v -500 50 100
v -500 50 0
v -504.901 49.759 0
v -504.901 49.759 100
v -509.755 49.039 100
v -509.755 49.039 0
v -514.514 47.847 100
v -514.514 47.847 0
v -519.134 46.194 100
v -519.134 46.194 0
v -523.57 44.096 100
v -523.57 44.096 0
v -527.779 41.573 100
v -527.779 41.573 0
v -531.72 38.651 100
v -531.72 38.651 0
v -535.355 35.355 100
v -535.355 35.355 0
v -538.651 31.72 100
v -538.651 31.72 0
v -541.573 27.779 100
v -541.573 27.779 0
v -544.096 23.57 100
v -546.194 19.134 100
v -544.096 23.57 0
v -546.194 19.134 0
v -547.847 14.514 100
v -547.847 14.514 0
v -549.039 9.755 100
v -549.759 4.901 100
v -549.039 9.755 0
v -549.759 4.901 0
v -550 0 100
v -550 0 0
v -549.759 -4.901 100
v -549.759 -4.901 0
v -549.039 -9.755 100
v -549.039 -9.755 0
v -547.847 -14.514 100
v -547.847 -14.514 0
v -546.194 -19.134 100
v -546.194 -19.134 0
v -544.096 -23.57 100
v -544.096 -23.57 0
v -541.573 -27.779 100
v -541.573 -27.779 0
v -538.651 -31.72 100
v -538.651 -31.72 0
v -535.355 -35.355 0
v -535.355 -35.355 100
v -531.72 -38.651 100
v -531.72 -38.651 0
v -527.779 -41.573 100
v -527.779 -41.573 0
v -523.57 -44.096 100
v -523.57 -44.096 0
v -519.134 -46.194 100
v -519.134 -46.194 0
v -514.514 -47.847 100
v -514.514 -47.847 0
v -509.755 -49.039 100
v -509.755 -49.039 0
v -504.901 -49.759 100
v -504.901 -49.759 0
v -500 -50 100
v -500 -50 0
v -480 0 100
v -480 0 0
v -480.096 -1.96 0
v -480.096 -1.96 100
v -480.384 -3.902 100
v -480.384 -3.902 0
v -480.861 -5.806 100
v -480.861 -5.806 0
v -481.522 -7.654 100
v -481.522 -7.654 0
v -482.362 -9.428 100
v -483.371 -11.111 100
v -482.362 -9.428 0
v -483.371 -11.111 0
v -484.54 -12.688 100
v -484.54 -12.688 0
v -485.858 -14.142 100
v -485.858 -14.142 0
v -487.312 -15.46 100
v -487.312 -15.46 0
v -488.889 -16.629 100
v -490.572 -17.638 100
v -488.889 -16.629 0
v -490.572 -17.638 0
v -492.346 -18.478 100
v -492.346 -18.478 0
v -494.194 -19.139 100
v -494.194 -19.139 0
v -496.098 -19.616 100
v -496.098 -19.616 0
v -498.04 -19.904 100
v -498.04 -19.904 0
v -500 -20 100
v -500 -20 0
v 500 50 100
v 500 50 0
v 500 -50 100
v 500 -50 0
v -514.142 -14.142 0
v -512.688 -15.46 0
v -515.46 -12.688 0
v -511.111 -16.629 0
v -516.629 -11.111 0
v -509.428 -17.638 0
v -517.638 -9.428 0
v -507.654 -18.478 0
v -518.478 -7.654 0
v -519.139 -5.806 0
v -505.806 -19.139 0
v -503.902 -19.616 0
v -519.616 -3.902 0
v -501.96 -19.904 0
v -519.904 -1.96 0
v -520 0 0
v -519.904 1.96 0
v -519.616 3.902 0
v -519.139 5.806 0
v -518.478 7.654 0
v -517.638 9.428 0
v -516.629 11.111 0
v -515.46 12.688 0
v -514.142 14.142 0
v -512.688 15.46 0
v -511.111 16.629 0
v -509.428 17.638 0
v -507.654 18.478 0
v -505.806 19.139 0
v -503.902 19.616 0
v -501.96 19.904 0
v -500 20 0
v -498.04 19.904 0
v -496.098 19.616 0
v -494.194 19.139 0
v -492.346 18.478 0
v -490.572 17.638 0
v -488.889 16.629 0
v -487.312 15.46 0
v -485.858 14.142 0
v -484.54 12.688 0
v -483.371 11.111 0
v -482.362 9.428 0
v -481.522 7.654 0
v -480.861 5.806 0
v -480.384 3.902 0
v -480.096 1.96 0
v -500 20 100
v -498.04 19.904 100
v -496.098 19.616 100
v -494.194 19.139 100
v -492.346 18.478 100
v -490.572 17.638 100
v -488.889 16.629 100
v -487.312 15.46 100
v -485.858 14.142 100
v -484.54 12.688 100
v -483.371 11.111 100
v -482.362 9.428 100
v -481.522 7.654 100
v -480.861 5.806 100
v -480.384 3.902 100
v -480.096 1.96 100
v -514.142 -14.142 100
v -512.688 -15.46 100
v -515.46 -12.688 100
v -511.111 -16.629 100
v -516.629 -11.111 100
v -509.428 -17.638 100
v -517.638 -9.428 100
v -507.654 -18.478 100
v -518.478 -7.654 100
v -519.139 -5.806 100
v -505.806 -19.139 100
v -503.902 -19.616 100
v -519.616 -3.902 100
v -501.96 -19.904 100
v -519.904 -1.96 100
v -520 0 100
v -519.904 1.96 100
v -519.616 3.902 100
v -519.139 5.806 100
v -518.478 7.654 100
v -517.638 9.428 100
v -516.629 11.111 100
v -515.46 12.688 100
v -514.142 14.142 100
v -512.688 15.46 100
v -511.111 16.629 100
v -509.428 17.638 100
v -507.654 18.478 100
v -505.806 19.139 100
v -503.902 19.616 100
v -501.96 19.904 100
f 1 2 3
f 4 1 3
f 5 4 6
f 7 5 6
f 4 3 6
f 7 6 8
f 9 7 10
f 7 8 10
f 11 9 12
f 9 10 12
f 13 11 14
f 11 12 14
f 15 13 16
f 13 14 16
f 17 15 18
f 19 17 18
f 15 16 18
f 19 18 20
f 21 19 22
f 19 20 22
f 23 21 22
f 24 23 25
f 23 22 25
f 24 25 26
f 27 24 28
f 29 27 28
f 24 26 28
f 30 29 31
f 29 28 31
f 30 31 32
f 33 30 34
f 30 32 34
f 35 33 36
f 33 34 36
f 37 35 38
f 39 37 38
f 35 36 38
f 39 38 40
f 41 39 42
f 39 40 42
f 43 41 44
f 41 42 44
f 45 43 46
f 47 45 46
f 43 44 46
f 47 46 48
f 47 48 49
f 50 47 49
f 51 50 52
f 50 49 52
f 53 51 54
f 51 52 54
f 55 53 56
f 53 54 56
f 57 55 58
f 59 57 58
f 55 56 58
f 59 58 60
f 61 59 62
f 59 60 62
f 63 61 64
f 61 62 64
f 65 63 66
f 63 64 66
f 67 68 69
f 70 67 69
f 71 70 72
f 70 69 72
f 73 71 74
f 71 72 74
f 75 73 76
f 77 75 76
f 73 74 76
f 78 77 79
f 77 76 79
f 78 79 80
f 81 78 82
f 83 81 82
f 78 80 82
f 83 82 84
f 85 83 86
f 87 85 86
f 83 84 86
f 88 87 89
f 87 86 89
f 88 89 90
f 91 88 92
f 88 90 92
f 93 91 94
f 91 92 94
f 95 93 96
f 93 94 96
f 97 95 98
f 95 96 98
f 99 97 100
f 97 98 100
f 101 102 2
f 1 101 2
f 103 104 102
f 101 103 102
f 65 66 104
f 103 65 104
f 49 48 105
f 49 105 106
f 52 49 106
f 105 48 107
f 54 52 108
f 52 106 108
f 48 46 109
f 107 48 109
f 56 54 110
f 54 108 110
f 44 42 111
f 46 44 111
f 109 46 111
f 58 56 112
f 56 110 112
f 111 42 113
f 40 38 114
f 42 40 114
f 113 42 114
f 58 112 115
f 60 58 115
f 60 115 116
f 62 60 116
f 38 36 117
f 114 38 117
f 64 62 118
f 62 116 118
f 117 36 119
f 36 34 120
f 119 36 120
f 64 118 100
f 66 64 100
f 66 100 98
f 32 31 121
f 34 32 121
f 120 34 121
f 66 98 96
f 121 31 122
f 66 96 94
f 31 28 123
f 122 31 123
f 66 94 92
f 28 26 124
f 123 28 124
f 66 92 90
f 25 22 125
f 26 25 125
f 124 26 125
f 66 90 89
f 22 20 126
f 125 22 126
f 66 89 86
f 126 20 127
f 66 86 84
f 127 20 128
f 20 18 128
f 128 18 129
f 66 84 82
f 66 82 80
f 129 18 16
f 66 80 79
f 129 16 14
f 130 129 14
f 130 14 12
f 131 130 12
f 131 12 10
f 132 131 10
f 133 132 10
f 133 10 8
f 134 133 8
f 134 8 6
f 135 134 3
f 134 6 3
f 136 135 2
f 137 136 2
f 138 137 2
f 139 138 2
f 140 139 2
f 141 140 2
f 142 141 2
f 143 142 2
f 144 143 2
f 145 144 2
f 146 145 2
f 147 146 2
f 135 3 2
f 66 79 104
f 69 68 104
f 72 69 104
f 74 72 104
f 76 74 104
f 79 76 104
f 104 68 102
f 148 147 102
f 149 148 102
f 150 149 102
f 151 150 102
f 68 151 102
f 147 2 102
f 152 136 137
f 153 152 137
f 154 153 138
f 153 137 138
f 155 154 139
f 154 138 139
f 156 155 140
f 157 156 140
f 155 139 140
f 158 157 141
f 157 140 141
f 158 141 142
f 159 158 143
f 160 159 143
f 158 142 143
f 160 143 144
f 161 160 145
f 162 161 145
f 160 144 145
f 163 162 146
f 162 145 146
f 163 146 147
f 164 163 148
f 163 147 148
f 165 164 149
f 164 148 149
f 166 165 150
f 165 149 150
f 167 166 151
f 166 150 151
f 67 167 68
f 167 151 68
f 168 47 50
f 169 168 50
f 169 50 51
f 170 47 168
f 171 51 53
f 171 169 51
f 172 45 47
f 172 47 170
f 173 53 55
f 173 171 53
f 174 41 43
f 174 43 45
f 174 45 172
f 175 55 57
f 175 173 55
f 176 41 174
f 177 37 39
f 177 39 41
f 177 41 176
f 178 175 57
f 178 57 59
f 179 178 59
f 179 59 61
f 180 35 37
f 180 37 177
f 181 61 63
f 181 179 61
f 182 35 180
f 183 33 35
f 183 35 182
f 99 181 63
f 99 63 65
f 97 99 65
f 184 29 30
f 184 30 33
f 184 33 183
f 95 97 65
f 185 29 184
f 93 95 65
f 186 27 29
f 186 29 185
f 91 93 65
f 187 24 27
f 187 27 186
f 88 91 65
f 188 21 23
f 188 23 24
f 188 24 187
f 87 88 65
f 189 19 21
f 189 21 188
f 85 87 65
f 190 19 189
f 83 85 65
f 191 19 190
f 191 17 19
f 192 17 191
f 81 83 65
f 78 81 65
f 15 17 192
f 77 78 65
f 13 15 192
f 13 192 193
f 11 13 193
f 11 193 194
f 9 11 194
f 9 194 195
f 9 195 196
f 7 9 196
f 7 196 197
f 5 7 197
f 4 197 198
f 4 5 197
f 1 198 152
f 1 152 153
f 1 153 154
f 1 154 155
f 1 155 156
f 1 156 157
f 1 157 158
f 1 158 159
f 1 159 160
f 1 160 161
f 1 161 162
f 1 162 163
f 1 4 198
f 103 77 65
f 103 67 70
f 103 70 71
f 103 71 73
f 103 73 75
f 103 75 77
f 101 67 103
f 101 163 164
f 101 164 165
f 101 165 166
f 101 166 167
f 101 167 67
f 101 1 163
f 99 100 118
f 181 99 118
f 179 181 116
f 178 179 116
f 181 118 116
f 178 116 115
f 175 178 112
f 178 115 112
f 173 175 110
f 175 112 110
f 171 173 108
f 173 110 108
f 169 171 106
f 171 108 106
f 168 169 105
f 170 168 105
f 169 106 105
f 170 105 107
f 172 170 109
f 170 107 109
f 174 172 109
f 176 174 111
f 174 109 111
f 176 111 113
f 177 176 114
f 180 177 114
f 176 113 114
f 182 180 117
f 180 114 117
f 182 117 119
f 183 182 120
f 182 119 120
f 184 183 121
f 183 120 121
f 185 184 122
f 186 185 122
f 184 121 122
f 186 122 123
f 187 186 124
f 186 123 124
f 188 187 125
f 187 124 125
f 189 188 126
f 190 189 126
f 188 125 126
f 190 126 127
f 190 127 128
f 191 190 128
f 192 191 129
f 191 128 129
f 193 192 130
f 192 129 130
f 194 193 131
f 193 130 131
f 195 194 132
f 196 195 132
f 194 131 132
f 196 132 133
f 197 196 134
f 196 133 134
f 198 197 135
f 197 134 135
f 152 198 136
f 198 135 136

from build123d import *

# Parameters (mm, degrees)
EXTRUDE_1_DEPTH = 100


with BuildPart() as part:
    # ｽｹｯﾁ1 → ﾎﾞｽ - 押し出し1 (new body)
    with BuildSketch(Plane.XY):
        with BuildLine():
            ThreePointArc((-500, 50), (-550, 0), (-500, -50))
            Line((-500, -50), (-500, -20))
            ThreePointArc((-500, -20), (-520, 0), (-500, 20))
            Line((-500, 20), (-500, 50))
        make_face()
        with BuildLine():
            Line((-500, -20), (-500, -50))
            ThreePointArc((-500, -50), (-464.644660941, -35.355339059), (-450, 0))
            ThreePointArc((-450, 0), (-464.644660941, 35.355339059), (-500, 50))
            Line((-500, 50), (-500, 20))
            ThreePointArc((-500, 20), (-485.857864376, 14.142135624), (-480, 0))
            ThreePointArc((-480, 0), (-485.857864376, -14.142135624), (-500, -20))
        make_face()
        with BuildLine():
            ThreePointArc((-450, 0), (-464.644660941, -35.355339059), (-500, -50))
            Line((-500, -50), (500, -50))
            Line((500, -50), (500, 50))
            Line((500, 50), (-500, 50))
            ThreePointArc((-500, 50), (-464.644660941, 35.355339059), (-450, 0))
        make_face()
    extrude(amount=EXTRUDE_1_DEPTH)


solid = part.part
